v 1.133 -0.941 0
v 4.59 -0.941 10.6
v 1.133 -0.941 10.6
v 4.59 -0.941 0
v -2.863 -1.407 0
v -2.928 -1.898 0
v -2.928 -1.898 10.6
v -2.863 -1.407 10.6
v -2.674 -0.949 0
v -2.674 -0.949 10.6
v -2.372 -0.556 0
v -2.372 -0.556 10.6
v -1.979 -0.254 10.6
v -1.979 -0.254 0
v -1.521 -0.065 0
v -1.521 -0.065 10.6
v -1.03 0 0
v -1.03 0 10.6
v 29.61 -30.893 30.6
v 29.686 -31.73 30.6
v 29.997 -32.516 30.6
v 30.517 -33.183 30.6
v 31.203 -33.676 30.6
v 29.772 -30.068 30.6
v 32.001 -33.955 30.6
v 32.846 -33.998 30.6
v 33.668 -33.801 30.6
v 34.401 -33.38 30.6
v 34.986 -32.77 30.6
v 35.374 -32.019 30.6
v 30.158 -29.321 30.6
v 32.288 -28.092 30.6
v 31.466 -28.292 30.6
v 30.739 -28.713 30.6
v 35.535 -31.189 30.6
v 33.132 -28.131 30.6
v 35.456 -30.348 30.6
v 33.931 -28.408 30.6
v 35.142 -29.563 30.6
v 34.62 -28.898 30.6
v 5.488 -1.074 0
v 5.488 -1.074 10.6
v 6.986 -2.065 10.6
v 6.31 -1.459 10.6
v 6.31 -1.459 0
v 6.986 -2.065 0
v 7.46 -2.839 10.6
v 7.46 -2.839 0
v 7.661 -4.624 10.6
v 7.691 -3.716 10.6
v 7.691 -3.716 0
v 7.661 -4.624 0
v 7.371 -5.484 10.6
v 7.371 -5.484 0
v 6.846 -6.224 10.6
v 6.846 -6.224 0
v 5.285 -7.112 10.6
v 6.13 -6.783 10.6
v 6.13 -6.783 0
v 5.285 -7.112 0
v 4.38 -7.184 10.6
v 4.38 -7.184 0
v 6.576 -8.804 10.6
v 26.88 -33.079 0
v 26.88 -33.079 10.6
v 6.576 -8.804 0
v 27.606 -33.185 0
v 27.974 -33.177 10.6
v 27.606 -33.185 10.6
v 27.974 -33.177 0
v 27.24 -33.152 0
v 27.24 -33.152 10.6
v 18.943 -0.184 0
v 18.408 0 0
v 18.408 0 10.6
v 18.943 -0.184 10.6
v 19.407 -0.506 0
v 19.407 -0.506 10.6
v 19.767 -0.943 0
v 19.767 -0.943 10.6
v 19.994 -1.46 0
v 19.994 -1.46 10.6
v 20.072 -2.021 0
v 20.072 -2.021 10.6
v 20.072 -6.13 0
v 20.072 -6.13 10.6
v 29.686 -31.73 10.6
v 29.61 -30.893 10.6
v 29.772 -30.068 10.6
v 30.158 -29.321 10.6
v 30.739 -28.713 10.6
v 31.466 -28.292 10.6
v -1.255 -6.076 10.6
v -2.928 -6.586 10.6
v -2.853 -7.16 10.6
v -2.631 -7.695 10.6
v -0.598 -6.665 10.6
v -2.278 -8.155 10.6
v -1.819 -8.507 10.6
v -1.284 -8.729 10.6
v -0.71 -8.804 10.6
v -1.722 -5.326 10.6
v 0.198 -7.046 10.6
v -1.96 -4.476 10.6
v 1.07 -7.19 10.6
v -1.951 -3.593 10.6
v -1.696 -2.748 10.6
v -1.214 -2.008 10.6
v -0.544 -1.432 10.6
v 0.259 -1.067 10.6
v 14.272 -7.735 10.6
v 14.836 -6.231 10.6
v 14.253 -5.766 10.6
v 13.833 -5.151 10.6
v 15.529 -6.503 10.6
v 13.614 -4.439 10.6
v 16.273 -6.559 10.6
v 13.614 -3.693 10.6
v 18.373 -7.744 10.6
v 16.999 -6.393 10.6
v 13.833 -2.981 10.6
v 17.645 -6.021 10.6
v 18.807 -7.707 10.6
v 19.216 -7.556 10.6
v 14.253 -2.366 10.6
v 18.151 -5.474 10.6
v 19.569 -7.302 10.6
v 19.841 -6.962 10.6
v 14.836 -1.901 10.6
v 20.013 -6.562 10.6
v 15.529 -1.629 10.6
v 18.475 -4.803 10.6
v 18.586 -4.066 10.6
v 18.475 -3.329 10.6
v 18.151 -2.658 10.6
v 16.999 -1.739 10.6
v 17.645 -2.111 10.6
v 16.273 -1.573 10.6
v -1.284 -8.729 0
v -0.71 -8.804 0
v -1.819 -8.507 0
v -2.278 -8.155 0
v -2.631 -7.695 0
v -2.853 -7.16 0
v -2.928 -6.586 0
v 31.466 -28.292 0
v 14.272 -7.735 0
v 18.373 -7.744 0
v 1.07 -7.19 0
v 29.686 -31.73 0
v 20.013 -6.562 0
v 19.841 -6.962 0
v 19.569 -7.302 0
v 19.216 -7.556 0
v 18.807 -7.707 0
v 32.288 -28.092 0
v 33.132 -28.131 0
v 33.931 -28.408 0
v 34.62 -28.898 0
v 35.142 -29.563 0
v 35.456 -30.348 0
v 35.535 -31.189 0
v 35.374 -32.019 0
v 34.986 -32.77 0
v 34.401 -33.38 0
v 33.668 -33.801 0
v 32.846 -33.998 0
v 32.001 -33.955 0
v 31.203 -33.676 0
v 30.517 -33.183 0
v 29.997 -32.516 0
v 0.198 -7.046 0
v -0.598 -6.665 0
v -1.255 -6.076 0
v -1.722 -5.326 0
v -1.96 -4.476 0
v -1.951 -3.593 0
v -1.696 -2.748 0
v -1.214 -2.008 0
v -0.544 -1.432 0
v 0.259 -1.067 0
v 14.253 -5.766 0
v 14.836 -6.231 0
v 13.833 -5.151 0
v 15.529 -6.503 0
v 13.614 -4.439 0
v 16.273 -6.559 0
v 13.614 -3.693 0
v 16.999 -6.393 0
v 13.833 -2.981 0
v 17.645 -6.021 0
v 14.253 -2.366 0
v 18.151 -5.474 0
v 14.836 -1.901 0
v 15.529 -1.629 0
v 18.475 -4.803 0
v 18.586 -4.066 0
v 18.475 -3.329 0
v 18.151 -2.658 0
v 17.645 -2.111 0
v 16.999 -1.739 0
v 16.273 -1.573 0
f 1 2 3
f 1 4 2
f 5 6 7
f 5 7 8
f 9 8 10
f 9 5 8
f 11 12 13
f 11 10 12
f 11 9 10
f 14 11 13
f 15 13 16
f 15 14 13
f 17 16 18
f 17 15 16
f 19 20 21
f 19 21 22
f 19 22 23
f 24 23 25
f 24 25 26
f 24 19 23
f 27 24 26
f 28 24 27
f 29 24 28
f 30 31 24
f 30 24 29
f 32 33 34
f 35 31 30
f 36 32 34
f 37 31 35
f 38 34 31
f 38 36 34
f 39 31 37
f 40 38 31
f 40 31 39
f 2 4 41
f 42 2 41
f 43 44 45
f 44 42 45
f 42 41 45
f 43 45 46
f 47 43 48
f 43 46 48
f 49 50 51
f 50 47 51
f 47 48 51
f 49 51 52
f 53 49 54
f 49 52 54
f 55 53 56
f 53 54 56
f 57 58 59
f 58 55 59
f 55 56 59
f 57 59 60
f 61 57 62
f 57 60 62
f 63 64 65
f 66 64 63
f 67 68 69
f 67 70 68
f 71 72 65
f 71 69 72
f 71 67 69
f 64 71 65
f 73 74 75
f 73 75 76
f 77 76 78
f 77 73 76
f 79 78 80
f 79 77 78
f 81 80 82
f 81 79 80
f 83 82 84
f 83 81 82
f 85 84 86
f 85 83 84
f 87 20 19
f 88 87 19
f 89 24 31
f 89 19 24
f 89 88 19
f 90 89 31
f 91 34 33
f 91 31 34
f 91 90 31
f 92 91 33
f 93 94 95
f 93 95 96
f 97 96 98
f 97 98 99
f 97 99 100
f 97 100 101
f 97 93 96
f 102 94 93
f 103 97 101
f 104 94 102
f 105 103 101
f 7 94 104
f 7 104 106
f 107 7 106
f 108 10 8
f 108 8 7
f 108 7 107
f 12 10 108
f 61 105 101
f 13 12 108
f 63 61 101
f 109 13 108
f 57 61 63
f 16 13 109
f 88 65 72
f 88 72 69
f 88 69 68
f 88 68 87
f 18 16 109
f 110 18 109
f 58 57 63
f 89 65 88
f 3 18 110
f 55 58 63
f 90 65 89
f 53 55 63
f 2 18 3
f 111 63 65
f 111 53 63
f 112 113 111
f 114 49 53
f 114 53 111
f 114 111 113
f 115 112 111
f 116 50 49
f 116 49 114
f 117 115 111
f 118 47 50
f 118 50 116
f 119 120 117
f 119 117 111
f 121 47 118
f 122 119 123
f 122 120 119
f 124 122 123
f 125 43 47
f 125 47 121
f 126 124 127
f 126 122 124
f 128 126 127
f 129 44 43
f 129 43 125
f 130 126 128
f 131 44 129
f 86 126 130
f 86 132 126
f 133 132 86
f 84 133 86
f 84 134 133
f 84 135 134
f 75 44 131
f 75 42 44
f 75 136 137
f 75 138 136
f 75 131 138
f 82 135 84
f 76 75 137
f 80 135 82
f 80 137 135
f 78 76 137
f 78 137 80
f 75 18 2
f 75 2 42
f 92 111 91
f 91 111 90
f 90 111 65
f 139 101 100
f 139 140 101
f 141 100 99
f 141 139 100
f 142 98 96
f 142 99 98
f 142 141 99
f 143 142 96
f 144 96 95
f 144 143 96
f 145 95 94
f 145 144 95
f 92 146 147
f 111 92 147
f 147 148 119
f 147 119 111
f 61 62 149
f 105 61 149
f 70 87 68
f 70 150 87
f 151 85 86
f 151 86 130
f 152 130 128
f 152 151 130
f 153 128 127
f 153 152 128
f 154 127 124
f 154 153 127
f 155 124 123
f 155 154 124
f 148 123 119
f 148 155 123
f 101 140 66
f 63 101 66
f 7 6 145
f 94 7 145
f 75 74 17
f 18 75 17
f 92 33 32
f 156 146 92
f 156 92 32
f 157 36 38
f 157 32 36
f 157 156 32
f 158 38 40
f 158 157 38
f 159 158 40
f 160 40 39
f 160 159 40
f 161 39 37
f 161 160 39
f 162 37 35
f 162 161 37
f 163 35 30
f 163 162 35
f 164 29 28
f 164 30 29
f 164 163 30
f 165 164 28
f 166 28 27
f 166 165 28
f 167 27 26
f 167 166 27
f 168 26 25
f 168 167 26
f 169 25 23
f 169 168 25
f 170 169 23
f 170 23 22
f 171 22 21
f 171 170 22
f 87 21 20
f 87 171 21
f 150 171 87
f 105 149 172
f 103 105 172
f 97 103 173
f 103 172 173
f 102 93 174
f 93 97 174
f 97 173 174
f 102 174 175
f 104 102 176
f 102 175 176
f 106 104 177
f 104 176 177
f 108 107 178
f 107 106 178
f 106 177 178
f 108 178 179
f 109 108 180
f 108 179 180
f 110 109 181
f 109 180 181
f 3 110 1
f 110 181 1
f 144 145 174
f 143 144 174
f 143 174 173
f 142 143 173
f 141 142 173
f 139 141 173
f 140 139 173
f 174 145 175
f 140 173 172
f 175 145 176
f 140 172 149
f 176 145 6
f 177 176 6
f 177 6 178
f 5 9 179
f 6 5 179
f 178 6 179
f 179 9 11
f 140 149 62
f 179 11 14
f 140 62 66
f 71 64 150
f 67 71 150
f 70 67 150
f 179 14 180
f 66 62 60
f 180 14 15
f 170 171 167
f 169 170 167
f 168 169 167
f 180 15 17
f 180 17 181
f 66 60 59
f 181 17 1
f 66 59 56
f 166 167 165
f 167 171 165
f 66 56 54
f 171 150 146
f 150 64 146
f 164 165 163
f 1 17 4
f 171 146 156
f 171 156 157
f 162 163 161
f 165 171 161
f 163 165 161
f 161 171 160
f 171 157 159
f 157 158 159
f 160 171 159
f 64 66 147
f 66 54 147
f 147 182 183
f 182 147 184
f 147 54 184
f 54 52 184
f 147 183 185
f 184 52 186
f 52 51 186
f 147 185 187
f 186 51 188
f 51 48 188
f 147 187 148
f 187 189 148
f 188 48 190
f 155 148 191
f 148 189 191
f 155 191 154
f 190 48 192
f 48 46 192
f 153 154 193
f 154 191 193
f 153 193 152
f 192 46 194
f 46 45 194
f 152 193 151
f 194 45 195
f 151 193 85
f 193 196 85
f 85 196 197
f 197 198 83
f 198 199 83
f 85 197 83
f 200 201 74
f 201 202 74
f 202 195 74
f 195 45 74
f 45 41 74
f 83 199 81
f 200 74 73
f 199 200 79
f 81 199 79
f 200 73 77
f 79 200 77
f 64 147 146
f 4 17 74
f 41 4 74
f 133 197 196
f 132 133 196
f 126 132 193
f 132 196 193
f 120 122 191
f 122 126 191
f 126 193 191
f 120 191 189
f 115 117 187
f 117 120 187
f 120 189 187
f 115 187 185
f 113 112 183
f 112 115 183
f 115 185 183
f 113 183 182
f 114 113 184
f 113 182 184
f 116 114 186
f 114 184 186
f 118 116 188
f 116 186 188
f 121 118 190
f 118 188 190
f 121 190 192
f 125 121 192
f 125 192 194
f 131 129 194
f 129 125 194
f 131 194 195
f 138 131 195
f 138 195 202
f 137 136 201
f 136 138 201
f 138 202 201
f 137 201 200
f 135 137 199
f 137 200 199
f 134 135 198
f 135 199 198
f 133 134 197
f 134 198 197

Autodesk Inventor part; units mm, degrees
ref_plane "YZ Plane" through (0, 0, 0) normal (1, 0, 0) x (0, 1, 0)
ref_plane "XZ Plane" through (0, 0, 0) normal (0, 1, 0) x (-1, 0, 0)
ref_plane "XY Plane" through (0, 0, 0) normal (0, 0, 1) x (1, 0, 0)
sketch "スケッチ1" plane through (0, 0, 0) normal (0, 0, 1) x (1, 0, 0)
  line L0 (18.3733, -7.7435) -> (14.2723, -7.7348)
  arc A0 (18.3733, -7.7435) -> (20.0717, -6.1303) centre (18.4564, -6.1303) ccw
  line L1 (20.0717, -2.0205) -> (20.0717, -6.1303)
  line L2 (18.408, 0) -> (-1.0303, 0)
  arc A1 (-1.0303, 0) -> (-2.9281, -1.8978) centre (-1.0303, -1.8978) ccw
  line L3 (-2.9281, -1.8978) -> (-2.9281, -6.5862)
  arc A2 (-2.9281, -6.5862) -> (-0.7099, -8.8044) centre (-0.7099, -6.5862) ccw
  arc A3 (26.8795, -33.0792) -> (27.974, -33.1771) centre (27.7186, -29.8656) ccw
  line L4 (29.6865, -31.7299) -> (27.974, -33.1771)
  arc A4 (29.6865, -31.7299) -> (31.4665, -28.292) centre (32.5726, -31.0444) ccw
  line L5 (31.4665, -28.292) -> (14.2723, -7.7348)
  circle A5 centre (16.0858, -4.066) radius 2.5
  line L6 (4.5899, -0.941) -> (1.1333, -0.941)
  arc A6 (4.3798, -7.1842) -> (4.5899, -0.941) centre (4.5858, -4.066) ccw
  line L7 (4.3798, -7.1842) -> (1.0695, -7.1903)
  arc A7 (1.1333, -0.941) -> (1.0695, -7.1903) centre (1.1379, -4.066) ccw
  line L8 (26.8795, -33.0792) -> (6.576, -8.8044)
  line L9 (-0.7099, -8.8044) -> (6.576, -8.8044)
  arc A8 (20.0717, -2.0205) -> (18.408, 0) centre (18.013, -2.0205) ccw
  point P0 (0, 0)
  dimension "d0" = 5
  dimension "d1" = 3.125
  dimension "d17" = 4.8539
  dimension "d24" = 11.5
  dimension "d29" = 14.9479
  dimension "d44" = 4.066
  dimension "d45" = 4.066
  dimension "d46" = 90
  dimension "d47" = 90
  dimension "d48" = 3.125
extrude "押し出し1" add sketch "スケッチ1" along normal blind 10.6
sketch "スケッチ2" plane through (0, 0, 10.6) normal (0, 0, 1) x (1, 0, 0)
  point P0 (0, 0)
sketch "スケッチ3" plane through (0, 0, 10.6) normal (0, 0, 1) x (1, 0, 0)
  arc A0 (29.6865, -31.7299) -> (31.4665, -28.292) centre (32.5726, -31.0444) ccw projected
  arc A1 (31.4665, -28.292) -> (29.6865, -31.7299) centre (32.5726, -31.0444) ccw
  point P0 (0, 0)
extrude "押し出し2" add sketch "スケッチ3" along normal blind 20
equation "\"d45\" = d44"
equation "\"d48\" = d1"
